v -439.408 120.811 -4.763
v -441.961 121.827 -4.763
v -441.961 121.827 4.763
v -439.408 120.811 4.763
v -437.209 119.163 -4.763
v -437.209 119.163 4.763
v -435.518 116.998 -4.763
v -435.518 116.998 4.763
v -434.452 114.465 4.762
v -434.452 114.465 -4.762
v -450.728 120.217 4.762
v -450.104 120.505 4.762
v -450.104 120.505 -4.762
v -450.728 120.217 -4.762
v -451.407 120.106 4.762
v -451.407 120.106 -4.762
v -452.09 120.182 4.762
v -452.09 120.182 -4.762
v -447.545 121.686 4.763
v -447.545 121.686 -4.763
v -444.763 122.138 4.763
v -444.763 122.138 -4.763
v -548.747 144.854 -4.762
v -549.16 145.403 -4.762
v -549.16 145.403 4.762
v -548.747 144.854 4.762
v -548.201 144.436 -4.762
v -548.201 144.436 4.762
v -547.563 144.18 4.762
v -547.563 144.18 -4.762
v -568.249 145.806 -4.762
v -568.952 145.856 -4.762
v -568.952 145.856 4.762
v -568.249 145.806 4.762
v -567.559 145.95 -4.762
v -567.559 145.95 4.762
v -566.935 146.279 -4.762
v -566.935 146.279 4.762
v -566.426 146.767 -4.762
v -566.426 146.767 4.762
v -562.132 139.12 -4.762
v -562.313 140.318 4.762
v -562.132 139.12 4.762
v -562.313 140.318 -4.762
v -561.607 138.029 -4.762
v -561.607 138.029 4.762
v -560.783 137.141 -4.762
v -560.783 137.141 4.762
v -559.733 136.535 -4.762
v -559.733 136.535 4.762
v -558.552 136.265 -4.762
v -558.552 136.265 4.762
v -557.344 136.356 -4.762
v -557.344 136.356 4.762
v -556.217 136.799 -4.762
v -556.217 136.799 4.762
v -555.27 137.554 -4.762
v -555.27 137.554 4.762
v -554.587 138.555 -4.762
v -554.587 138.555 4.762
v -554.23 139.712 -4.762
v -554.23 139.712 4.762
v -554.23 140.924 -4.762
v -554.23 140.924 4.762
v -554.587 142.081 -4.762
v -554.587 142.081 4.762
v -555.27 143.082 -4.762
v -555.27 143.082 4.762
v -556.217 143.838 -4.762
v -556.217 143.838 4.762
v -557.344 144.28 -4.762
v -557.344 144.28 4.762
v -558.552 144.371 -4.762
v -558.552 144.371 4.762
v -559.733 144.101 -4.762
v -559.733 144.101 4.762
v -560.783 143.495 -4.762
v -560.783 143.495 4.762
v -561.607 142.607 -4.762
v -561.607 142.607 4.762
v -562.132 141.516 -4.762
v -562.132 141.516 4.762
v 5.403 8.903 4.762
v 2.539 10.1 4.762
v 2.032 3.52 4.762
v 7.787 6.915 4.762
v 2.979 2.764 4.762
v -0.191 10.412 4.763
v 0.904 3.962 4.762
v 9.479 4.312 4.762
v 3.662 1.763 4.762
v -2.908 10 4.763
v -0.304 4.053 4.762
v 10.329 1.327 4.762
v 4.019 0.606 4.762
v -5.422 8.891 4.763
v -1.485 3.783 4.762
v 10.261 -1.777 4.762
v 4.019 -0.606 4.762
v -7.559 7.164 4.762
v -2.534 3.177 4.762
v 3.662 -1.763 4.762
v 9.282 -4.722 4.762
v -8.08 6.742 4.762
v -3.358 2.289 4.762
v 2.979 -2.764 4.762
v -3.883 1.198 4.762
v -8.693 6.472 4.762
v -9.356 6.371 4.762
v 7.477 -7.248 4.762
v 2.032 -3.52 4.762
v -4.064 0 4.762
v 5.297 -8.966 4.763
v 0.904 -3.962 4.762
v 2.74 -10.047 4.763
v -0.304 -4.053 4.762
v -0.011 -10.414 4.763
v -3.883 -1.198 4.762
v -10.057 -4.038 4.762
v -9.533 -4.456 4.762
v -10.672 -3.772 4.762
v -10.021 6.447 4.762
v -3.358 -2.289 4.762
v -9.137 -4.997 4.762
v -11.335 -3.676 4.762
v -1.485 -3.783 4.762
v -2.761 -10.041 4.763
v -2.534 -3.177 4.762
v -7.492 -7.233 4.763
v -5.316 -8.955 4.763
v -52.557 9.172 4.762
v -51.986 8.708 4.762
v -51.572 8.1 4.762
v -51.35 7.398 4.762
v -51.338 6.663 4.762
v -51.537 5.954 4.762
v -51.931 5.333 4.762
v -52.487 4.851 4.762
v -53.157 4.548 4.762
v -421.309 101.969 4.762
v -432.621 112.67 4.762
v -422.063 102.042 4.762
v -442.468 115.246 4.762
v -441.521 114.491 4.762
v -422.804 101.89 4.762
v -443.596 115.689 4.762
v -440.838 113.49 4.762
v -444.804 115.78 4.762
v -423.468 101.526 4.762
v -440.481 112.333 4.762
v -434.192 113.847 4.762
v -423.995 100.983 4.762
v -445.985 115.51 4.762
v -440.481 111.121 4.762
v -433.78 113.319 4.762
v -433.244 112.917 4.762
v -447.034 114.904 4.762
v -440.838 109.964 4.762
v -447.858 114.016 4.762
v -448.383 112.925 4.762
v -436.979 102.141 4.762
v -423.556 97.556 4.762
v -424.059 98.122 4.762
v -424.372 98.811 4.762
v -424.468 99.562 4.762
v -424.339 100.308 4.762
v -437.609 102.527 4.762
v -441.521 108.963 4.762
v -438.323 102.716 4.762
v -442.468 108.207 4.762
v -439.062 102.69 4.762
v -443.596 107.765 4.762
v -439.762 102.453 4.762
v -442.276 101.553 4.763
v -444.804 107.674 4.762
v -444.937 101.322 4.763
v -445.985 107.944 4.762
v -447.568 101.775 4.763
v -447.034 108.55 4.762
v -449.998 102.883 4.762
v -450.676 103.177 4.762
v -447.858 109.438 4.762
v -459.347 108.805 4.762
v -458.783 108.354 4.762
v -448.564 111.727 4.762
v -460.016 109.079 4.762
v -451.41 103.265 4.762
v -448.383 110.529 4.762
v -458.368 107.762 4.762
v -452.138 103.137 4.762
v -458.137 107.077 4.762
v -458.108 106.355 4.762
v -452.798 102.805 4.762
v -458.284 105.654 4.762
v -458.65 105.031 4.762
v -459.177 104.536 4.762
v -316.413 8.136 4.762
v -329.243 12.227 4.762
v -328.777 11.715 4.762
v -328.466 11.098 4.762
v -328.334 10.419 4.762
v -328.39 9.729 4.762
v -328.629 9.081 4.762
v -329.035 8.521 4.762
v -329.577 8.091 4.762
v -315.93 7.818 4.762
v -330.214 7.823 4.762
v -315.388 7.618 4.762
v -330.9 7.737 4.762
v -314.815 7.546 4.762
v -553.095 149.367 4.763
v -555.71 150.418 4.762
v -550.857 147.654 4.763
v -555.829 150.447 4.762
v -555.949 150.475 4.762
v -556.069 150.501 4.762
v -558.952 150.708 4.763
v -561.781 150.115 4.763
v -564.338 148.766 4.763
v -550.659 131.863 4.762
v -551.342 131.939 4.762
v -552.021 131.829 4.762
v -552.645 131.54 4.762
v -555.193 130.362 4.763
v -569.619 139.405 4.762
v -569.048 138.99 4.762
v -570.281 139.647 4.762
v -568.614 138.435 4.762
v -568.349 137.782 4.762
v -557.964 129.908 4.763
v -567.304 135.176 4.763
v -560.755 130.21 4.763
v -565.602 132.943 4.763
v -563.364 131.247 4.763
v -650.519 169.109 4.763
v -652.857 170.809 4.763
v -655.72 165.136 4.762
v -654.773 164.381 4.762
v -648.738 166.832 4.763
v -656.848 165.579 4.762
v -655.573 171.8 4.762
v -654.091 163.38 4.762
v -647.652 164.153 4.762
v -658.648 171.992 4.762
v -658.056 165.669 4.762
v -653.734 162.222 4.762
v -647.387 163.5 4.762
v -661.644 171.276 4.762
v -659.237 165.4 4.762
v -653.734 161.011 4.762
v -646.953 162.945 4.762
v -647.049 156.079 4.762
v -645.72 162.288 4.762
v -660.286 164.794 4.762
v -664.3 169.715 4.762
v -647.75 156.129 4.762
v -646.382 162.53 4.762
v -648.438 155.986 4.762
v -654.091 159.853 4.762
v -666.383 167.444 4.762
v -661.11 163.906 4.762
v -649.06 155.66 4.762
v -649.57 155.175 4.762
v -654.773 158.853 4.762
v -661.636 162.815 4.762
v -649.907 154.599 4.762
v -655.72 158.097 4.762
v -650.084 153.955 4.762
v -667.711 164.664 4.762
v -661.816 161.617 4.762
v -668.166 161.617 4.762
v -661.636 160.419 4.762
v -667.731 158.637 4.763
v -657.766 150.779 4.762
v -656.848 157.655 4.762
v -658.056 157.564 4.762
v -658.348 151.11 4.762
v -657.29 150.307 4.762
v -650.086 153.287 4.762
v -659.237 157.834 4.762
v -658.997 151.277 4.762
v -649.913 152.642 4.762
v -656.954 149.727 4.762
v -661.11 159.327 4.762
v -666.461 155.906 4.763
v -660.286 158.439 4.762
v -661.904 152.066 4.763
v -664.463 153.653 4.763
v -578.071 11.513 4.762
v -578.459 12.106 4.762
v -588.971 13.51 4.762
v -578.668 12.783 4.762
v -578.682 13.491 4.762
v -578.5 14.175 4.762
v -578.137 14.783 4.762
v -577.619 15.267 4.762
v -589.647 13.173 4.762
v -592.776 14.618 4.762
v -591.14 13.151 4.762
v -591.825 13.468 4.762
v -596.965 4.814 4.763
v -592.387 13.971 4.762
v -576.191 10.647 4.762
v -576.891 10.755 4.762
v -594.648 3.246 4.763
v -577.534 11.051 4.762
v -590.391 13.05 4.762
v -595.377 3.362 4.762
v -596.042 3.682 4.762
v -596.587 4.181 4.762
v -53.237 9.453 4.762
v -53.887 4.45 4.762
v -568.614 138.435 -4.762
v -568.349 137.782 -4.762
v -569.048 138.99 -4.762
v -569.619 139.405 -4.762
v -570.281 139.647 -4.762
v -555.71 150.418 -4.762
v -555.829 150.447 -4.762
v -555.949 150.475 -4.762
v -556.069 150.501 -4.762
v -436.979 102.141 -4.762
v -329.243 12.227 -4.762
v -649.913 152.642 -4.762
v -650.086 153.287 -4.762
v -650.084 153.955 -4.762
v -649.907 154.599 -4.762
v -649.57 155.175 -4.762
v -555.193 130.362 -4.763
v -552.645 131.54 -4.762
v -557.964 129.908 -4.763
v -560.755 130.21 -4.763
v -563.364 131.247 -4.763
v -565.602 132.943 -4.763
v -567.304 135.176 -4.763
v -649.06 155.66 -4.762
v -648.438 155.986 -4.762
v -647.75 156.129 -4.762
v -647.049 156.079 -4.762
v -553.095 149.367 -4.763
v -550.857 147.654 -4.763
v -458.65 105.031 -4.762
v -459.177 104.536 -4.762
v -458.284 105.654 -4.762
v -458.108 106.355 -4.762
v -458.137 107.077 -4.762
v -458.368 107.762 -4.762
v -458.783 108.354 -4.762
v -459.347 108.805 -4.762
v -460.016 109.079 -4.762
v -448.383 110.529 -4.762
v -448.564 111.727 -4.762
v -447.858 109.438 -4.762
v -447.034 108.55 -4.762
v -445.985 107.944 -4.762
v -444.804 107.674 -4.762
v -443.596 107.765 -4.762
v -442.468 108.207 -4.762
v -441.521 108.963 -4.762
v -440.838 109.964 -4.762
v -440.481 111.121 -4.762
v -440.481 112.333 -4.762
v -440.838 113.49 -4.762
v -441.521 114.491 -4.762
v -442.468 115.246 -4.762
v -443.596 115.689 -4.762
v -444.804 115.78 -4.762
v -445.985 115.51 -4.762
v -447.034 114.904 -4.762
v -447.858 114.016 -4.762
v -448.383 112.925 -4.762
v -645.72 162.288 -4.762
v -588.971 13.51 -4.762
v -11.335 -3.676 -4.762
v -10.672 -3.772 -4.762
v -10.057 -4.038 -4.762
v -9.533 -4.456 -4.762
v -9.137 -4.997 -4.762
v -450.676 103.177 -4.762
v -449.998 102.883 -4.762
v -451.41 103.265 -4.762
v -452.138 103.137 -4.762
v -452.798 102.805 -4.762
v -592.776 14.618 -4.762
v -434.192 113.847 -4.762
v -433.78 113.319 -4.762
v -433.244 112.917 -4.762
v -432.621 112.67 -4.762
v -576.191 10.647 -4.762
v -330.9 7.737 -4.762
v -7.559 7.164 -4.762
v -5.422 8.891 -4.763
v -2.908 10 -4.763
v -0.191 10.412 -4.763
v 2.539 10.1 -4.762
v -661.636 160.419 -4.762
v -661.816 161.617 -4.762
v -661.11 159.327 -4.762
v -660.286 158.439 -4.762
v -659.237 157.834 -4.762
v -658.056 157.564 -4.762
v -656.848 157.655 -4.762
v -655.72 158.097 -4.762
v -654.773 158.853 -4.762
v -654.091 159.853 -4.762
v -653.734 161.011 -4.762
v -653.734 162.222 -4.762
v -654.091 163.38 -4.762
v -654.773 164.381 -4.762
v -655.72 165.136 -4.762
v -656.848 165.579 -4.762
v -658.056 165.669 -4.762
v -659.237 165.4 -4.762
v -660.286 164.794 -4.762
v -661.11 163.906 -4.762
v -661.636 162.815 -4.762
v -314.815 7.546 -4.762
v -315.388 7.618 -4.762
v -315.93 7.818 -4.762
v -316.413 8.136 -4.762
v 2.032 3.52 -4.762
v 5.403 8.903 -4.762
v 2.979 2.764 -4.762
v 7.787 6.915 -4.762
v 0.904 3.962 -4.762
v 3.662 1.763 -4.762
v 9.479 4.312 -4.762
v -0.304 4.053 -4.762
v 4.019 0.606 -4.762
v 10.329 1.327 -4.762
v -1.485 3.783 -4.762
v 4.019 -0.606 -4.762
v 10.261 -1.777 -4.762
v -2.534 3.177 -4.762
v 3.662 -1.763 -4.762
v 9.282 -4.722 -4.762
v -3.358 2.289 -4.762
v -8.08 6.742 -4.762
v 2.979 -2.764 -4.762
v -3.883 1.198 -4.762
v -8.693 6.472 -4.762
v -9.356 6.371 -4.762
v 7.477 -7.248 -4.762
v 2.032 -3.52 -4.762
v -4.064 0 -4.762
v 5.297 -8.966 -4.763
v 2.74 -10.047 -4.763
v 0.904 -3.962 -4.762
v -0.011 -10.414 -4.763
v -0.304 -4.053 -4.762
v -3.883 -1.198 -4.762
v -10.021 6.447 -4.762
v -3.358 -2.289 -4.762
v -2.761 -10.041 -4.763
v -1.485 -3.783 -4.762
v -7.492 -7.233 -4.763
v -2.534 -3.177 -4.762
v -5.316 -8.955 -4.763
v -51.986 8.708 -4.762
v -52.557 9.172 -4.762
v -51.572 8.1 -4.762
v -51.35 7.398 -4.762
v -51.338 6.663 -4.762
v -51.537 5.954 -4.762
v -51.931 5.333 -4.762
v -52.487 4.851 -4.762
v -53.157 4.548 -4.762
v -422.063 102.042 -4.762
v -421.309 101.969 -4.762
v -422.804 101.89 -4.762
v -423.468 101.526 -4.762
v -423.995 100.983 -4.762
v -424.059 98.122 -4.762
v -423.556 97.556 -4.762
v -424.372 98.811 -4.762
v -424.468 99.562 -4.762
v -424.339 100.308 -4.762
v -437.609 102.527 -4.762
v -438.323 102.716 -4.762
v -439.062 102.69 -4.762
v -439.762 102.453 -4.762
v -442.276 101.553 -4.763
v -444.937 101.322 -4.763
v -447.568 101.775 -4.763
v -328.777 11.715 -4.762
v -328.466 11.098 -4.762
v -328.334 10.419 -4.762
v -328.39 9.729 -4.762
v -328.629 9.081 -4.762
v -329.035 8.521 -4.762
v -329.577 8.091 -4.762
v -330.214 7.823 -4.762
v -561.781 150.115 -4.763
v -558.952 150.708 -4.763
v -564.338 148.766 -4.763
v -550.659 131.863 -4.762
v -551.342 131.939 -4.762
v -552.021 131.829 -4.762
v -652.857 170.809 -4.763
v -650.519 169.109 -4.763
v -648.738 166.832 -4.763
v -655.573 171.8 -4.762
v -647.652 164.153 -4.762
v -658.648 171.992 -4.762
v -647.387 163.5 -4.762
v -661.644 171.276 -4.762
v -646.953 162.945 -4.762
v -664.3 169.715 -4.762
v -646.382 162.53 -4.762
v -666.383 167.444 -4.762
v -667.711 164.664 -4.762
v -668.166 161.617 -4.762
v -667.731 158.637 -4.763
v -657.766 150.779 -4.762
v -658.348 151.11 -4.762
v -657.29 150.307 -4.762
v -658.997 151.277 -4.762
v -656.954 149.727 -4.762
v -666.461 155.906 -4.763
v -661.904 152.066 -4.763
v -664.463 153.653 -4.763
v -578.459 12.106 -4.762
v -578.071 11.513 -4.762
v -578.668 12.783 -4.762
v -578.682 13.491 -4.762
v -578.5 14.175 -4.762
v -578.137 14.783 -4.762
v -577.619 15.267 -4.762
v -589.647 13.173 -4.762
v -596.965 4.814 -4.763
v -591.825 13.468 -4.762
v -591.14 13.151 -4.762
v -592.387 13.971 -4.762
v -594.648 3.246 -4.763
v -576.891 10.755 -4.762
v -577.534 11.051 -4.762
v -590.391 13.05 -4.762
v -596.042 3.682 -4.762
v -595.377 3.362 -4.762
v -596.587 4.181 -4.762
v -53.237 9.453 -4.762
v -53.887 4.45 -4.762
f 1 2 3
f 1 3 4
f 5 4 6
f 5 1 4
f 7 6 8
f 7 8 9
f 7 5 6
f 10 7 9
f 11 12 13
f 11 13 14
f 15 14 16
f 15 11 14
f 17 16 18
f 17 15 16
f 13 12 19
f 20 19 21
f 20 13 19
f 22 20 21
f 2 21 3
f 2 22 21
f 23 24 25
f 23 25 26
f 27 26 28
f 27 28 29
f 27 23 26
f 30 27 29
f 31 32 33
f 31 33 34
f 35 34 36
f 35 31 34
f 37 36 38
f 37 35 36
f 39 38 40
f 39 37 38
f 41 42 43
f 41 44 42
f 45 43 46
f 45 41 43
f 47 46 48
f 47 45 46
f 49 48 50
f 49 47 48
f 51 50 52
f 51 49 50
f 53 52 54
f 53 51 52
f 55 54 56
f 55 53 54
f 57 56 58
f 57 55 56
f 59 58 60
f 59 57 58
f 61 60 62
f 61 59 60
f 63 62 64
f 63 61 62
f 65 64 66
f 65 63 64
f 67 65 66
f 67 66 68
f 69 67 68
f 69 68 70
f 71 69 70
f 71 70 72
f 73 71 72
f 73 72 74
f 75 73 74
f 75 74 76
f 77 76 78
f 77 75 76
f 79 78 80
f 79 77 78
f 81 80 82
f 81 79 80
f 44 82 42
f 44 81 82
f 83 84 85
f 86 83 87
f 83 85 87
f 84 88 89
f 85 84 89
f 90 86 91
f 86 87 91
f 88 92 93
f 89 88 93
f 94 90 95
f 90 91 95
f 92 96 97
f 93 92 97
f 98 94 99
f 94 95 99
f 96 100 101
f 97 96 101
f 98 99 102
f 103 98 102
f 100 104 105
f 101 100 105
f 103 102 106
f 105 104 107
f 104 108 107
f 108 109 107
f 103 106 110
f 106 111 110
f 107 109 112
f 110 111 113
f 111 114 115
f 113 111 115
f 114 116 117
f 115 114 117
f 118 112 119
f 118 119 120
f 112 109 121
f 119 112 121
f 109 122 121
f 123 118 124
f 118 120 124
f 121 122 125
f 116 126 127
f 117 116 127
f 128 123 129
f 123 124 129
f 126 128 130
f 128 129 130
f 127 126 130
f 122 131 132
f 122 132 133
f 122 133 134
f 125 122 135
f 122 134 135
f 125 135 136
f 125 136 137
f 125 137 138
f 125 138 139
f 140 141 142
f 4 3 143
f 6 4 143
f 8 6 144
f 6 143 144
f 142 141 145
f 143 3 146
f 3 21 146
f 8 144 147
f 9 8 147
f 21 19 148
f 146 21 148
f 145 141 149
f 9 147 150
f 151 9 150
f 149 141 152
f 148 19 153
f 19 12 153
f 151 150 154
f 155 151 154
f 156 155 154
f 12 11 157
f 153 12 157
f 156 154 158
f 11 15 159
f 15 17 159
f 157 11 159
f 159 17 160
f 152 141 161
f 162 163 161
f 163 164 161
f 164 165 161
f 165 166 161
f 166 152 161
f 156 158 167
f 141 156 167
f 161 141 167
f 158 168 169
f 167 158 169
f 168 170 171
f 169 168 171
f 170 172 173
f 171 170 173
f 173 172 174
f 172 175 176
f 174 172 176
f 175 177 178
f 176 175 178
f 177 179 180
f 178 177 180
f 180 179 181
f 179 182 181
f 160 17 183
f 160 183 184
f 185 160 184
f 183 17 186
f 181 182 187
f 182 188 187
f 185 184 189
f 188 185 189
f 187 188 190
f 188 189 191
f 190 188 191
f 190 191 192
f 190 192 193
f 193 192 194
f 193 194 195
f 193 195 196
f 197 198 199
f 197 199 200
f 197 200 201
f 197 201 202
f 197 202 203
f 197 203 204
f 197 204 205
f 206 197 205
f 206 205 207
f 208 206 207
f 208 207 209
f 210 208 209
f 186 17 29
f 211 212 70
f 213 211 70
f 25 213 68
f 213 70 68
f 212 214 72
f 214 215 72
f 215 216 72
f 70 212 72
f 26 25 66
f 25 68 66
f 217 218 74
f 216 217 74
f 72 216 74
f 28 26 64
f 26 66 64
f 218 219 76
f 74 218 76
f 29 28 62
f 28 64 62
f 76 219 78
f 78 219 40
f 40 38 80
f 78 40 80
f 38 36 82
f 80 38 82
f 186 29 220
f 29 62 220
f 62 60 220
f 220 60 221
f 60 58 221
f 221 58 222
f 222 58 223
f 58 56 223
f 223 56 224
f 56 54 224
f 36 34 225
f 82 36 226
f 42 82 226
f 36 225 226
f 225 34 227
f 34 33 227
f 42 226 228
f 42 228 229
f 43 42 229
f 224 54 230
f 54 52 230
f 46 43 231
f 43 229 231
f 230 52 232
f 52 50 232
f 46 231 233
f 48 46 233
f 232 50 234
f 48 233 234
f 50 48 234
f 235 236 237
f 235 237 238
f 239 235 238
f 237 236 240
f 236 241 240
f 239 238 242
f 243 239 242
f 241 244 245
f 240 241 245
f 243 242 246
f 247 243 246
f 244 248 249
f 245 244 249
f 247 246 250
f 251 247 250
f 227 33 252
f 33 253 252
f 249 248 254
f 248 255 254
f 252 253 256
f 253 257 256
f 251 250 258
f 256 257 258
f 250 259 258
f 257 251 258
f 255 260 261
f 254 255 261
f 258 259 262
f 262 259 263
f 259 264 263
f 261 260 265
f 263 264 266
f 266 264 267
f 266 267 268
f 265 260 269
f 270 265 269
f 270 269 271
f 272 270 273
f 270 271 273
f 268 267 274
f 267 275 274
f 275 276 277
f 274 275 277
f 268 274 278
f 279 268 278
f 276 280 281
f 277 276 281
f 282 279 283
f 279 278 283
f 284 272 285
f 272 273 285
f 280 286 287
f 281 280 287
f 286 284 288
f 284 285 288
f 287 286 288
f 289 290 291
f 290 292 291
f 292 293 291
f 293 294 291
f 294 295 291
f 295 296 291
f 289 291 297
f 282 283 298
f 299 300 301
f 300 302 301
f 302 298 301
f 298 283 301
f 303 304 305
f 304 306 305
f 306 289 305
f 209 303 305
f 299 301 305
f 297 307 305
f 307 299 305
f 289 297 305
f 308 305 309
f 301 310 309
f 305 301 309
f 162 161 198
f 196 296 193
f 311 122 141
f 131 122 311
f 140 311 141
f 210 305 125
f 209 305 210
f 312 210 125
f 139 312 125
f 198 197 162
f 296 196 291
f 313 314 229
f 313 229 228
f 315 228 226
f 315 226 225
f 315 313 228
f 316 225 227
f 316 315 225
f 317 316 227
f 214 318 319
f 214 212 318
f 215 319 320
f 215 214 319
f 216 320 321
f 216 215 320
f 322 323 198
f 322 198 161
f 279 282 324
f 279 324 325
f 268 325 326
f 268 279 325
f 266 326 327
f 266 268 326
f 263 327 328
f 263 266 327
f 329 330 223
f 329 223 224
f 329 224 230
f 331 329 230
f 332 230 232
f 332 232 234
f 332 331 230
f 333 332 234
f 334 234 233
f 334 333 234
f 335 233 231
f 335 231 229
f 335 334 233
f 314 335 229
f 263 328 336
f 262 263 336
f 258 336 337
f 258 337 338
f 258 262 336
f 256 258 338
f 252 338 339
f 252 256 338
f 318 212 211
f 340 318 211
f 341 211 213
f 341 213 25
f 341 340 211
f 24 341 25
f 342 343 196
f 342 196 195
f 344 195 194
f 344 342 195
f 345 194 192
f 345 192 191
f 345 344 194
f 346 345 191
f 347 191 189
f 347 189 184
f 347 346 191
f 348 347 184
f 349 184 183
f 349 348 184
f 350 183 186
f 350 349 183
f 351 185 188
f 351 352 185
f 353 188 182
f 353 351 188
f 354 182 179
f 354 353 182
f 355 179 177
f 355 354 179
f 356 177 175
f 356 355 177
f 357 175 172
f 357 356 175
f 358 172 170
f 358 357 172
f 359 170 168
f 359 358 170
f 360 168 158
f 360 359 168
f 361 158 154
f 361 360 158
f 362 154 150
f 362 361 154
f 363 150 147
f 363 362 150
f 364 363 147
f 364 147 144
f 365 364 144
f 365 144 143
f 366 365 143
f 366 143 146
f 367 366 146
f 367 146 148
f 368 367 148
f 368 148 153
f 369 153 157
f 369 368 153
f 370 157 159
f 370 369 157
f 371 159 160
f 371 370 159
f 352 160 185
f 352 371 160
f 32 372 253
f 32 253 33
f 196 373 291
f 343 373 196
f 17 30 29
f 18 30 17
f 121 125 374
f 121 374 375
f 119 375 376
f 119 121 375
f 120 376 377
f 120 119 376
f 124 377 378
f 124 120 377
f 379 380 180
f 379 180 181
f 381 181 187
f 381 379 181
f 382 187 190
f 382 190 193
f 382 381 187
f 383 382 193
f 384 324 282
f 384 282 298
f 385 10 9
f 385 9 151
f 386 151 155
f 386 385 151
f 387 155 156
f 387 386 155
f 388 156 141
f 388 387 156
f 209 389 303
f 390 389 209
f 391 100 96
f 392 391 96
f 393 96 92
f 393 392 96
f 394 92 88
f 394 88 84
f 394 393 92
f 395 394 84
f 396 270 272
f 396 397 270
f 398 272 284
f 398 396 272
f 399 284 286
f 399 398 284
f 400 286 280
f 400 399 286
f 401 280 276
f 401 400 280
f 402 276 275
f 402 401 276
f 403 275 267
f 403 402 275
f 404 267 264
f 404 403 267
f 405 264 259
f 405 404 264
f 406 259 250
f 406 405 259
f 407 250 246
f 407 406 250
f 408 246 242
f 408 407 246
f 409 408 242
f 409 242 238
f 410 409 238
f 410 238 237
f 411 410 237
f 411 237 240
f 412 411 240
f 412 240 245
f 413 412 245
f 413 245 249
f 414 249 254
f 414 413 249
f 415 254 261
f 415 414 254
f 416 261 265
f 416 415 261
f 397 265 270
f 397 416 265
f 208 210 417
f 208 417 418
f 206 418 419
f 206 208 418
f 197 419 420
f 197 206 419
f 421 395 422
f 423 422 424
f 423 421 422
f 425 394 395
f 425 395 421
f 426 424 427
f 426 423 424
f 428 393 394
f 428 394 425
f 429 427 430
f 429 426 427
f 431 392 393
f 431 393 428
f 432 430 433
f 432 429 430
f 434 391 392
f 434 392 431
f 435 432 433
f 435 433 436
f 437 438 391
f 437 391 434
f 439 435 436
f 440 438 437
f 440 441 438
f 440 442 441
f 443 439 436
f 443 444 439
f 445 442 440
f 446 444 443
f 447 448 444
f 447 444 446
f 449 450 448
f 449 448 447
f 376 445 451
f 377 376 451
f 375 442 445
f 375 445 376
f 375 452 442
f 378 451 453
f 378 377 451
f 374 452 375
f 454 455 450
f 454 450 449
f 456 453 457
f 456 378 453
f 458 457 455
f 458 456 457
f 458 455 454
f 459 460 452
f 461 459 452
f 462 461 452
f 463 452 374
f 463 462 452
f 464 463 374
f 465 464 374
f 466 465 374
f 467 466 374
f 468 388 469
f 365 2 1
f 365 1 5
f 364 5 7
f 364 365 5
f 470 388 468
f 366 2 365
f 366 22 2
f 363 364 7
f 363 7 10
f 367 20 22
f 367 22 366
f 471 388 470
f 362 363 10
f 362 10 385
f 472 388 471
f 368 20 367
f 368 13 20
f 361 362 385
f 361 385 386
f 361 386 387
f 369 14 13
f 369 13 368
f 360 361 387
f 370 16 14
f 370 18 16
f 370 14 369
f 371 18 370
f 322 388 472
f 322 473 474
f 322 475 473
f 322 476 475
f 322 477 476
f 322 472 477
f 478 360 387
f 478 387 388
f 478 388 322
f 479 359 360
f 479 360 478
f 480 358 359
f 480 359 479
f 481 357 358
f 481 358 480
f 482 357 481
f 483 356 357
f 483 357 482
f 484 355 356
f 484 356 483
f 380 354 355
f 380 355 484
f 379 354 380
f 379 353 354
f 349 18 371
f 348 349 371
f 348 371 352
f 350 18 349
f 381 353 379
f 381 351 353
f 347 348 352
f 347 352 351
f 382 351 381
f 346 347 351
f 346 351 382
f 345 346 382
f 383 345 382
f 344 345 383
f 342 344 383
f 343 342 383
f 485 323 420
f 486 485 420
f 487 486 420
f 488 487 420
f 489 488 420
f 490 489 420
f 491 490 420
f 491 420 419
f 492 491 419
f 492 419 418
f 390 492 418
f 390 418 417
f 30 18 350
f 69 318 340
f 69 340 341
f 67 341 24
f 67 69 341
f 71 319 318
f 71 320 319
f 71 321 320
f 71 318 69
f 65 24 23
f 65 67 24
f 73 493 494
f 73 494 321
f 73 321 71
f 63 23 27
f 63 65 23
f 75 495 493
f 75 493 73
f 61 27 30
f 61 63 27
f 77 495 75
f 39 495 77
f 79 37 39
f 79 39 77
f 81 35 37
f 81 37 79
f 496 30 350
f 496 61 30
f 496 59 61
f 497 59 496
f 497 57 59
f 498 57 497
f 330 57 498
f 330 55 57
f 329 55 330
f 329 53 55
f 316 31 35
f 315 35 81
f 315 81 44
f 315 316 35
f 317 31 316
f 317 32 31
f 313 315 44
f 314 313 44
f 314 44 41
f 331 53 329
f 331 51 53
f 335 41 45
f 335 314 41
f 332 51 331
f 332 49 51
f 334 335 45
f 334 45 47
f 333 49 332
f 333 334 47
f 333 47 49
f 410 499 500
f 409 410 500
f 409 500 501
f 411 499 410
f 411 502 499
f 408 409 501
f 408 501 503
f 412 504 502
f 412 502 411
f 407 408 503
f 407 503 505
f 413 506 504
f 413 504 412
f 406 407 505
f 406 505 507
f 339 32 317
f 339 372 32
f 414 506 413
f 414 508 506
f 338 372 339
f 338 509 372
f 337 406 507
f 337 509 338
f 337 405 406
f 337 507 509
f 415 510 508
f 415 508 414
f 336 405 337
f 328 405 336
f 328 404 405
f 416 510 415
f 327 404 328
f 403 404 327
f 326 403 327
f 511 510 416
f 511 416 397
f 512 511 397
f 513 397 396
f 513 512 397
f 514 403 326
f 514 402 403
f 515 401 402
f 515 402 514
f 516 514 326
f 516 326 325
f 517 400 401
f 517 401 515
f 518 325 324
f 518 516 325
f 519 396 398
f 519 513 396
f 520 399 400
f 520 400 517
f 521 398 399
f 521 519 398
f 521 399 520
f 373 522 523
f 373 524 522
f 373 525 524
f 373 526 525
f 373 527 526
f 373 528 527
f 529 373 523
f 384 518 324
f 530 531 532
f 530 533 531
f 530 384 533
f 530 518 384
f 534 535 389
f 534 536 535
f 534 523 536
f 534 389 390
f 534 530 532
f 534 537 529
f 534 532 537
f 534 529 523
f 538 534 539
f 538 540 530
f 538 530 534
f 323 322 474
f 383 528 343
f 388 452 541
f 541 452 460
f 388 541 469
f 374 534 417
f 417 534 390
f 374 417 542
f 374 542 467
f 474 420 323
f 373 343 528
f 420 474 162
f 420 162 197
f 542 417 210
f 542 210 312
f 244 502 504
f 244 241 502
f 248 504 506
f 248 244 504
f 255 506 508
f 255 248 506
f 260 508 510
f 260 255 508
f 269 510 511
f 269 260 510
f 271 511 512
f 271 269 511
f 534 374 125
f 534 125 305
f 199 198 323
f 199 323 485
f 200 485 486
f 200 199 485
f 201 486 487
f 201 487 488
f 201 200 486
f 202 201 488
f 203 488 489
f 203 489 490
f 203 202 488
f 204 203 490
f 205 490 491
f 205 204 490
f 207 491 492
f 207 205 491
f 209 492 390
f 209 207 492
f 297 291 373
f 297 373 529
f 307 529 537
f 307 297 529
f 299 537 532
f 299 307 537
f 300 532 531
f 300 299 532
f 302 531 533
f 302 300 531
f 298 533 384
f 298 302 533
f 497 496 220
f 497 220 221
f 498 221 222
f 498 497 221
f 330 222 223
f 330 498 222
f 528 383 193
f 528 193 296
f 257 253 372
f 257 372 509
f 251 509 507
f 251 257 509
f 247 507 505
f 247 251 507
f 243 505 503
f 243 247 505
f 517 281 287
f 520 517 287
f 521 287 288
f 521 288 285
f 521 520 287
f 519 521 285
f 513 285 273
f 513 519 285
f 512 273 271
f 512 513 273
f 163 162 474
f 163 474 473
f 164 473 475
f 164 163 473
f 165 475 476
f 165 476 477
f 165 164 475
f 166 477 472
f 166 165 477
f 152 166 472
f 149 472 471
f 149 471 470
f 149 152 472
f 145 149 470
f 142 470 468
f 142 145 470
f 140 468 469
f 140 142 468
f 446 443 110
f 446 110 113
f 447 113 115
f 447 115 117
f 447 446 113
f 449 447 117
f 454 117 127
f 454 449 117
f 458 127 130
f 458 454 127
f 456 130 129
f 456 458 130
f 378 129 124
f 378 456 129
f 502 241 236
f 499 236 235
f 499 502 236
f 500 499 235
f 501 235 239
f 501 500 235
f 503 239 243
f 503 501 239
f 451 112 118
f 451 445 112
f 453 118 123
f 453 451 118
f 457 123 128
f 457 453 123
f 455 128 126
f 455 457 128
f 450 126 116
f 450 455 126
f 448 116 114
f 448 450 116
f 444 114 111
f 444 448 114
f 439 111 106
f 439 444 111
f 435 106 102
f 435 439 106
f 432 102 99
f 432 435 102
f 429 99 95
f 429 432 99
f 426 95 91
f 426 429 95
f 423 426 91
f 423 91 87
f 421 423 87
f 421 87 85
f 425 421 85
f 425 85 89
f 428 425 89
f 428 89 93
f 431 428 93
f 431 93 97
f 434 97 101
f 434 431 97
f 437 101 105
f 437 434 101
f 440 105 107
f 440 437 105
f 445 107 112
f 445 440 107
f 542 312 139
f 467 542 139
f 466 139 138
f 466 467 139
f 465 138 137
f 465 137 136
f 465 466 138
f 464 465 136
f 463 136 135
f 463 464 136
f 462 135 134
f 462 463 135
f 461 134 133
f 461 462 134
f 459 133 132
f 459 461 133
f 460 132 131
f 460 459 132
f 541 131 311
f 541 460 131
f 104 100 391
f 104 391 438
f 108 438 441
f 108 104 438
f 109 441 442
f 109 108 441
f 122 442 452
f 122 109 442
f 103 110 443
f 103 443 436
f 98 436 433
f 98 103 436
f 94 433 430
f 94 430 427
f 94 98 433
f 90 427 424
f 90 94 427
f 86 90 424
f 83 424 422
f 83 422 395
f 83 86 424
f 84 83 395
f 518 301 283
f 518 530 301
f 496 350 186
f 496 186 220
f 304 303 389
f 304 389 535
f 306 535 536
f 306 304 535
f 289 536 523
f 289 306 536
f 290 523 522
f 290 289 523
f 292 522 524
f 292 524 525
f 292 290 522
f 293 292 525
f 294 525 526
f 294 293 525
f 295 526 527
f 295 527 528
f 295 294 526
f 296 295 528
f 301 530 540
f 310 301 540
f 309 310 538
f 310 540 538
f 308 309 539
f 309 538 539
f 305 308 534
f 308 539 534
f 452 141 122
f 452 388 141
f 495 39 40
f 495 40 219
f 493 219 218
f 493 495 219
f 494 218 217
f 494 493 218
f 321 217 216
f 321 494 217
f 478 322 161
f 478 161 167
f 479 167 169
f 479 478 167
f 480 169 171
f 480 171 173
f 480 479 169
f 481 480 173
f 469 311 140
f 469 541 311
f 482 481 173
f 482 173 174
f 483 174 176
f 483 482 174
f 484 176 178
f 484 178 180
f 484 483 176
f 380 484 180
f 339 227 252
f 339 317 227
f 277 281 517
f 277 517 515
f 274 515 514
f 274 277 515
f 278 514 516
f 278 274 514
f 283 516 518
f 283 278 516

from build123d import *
from build123d.topology import SkipClean

# Parameters (mm, degrees)
SKETCH1_R               = 4.064
BOSS_EXTRUDE1_DEPTH     = 4.7625
CUT_EXTRUDE2_DEPTH      = 690.973625243
CUT_EXTRUDE2_DEPTH_BACK = 690.973625243
FILLET5_R               = 2.54


with BuildPart() as part:
    # Sketch1 → Boss-Extrude1 (new, symmetric)
    with BuildSketch(Plane.XY):
        with BuildLine():
            Line((-668.166397408, 161.616774863), (-668.166397408, 18.64362624))
            Line((-668.166397408, 18.64362624), (-87.838367094, -105.574938169))
            Line((-87.838367094, -105.574938169), (7.477398085, -7.248442169))
            ThreePointArc((7.477398085, -7.248442169), (10.016034099, 2.851395611), (2.538636014, 10.09983778))
            Line((2.538636014, 10.09983778), (-555.710049471, 150.417954639))
            ThreePointArc((-555.710049471, 150.417954639), (-555.889133178, 150.461287413), (-556.068955499, 150.501445056))
            Line((-556.068955499, 150.501445056), (-655.572667421, 171.800103061))
            ThreePointArc((-655.572667421, 171.800103061), (-664.300362279, 169.714648167), (-668.166397408, 161.616774863))
        make_face()
        with Locations(Location((-444.5, 111.726914125, 0), (0, 0, 180))):
            Circle(SKETCH1_R, mode=Mode.SUBTRACT)
        with Locations(Location((-657.752397408, 161.616774863, 0), (0, 0, 180))):
            Circle(SKETCH1_R, mode=Mode.SUBTRACT)
        with Locations(Location((0, 0, 0), (0, 0, 180))):
            Circle(SKETCH1_R, mode=Mode.SUBTRACT)
        with Locations(Location((-558.248685485, 140.318116858, 0), (0, 0, 180))):
            Circle(SKETCH1_R, mode=Mode.SUBTRACT)
    extrude(amount=BOSS_EXTRUDE1_DEPTH, both=True)

    # Sketch3 → Cut-Extrude2 (cut, two sides: drawn at the far end of the back side and taken through both)
    with SkipClean():  # the faces are left unmerged after this step: merging them gives an invalid solid
        with BuildSketch(Plane.XY.offset(-CUT_EXTRUDE2_DEPTH_BACK)):
            with BuildLine():
                Line((-441.961363863, 121.826751874), (-555.710049471, 150.417954639))
                ThreePointArc((-555.710049471, 150.417954639), (-551.509786292, 148.257804111), (-548.695715232, 144.464459263))
                Line((-548.695715232, 144.464459263), (-450.957072675, 119.897447062))
                ThreePointArc((-450.957072675, 119.897447062), (-446.683824739, 121.909364985), (-441.961363863, 121.826751874))
            make_face()
            with BuildLine():
                Line((2.538636014, 10.09983778), (-441.961363863, 121.826751874))
                ThreePointArc((-441.961363863, 121.826751874), (-436.714943747, 118.643871197), (-434.171590545, 113.059338277))
                Line((-434.171590545, 113.059338277), (-8.470870908, 6.057701053))
                ThreePointArc((-8.470870908, 6.057701053), (-3.589229728, 9.775930951), (2.538636014, 10.09983778))
            make_face()
            with BuildLine():
                ThreePointArc((-567.282647841, 145.498746179), (-562.491547061, 149.8286122), (-556.068955499, 150.501445056))
                Line((-556.068955499, 150.501445056), (-655.572667421, 171.800103061))
                ThreePointArc((-655.572667421, 171.800103061), (-649.98823881, 168.557180995), (-647.389331402, 162.645492005))
                Line((-647.389331402, 162.645492005), (-567.282647841, 145.498746179))
            make_face()
            with BuildLine():
                Line((-454.629375008, 107.72545344), (-551.79161281, 132.147583922))
                ThreePointArc((-551.79161281, 132.147583922), (-562.318768923, 130.73240787), (-568.611751491, 139.289399717))
                Line((-568.611751491, 139.289399717), (-648.718435052, 156.436145543))
                ThreePointArc((-648.718435052, 156.436145543), (-649.539598332, 155.213546979), (-650.525019748, 154.119014654))
                Line((-650.525019748, 154.119014654), (-591.564686258, 11.691300387))
                Line((-591.564686258, 11.691300387), (-454.629375008, 107.72545344))
            make_face()
            with BuildLine():
                ThreePointArc((-657.565596078, 151.204450375), (-665.04986433, 154.187214141), (-668.166397408, 161.616774863))
                Line((-668.166397408, 161.616774863), (-668.166397408, 18.64362624))
                Line((-668.166397408, 18.64362624), (-596.32392942, 3.265826494))
                Line((-596.32392942, 3.265826494), (-657.565596078, 151.204450375))
            make_face()
            with BuildLine():
                Line((-87.838367094, -105.574938169), (7.477398085, -7.248442169))
                ThreePointArc((7.477398085, -7.248442169), (-2.105505073, -10.198933493), (-9.73654702, -3.694732483))
                Line((-9.73654702, -3.694732483), (-596.32392942, 3.265826494))
                Line((-596.32392942, 3.265826494), (-87.838367094, -105.574938169))
            make_face()
            with BuildLine():
                ThreePointArc((-438.373626695, 103.305575388), (-444.936585447, 101.322069621), (-451.310312416, 103.848396447))
                Line((-451.310312416, 103.848396447), (-584.072378221, 10.740983679))
                Line((-584.072378221, 10.740983679), (-323.761303231, 7.652082274))
                Line((-323.761303231, 7.652082274), (-438.373626695, 103.305575388))
            make_face()
            Polygon((-32.313863809, 4.193710765), (-432.091689332, 104.679521297), (-315.718749539, 7.556647781), align=None)
        extrude(amount=CUT_EXTRUDE2_DEPTH + CUT_EXTRUDE2_DEPTH_BACK, mode=Mode.SUBTRACT)

    # Fillet5
    # the kernel refuses this fillet: 2.54 mm, written as the material it adds along each edge
    with BuildSketch(Plane(origin=(-432.091689332, 104.679521297, 4.7625), x_dir=(0.9698327040744903, -0.24377146286545154, 0), z_dir=(0, 0, -1))) as fillet5_piece_1:
        with BuildLine():
            CenterArc((FILLET5_R * 4.37701255665, FILLET5_R), FILLET5_R, 115.738557535, 154.261442465)
            Line((FILLET5_R * 3.94274718517, FILLET5_R * 1.90078498386), (0, 0))
            Line((0, 0), (FILLET5_R * 4.37701255665, 0))
        make_face()
    extrude(amount=9.525)
    with BuildSketch(Plane(origin=(-32.313863809, 4.193710765, -4.7625), x_dir=(-0.9698327040744894, 0.24377146286545465, 0), z_dir=(0, 0, 1))) as fillet5_piece_2:
        with BuildLine():
            CenterArc((FILLET5_R * 8.4937923688, FILLET5_R), FILLET5_R, 103.429391771, 166.570608229)
            Line((FILLET5_R * 8.26154547816, FILLET5_R * 1.97265686744), (0, 0))
            Line((0, 0), (FILLET5_R * 8.4937923688, 0))
        make_face()
    extrude(amount=9.525)
    with BuildSketch(Plane(origin=(-315.718749539, 7.556647781, 4.7625), x_dir=(-0.7677492318062843, 0.6407504327434048, 0), z_dir=(0, 0, -1))) as fillet5_piece_3:
        with BuildLine():
            CenterArc((FILLET5_R * 0.355768854879, FILLET5_R), FILLET5_R, 230.832050694, 39.167949306)
            Line((-FILLET5_R * 0.275826852618, FILLET5_R * 0.224702081603), (0, 0))
            Line((0, 0), (FILLET5_R * 0.355768854879, 0))
        make_face()
    extrude(amount=9.525)
    with BuildSketch(Plane(origin=(-450.957072675, 119.897447062, 4.7625), x_dir=(-0.9698327040744915, 0.24377146286544657, 0), z_dir=(0, 0, -1))) as fillet5_piece_4:
        with BuildLine():
            CenterArc((1.167973372, 2.54), FILLET5_R, 223.335922736, 46.664077264)
            ThreePointArc((-0.679476901, 0.796862745), (-0.329715617, 0.406977742), (0, 0))
            Line((0, 0), (1.167973372, 0))
        make_face()
    extrude(amount=9.525)
    with BuildSketch(Plane(origin=(-548.695715232, 144.464459263, -4.7625), x_dir=(-0.44376973183337304, 0.8961408511548484, 0), z_dir=(0, 0, 1))) as fillet5_piece_5:
        with BuildLine():
            CenterArc((1.174934772, -2.536787354), FILLET5_R, 92.882026708, 46.664077264)
            Line((-0.75782313, -0.888744002), (0, 0))
            ThreePointArc((0, 0), (0.523612236, -0.013171849), (1.047224471, 0))
        make_face()
    extrude(amount=9.525)
    with BuildSketch(Plane(origin=(-9.73654702, -3.694732483, 4.7625), x_dir=(0.4182943281117258, -0.9083115407554614, 0), z_dir=(0, 0, -1)), Plane(origin=(-650.525019748, 154.119014654, 4.7625), x_dir=(0.670494914726067, 0.7419141253045962, 0), z_dir=(0, 0, -1))) as fillet5_piece_6:
        with BuildLine():
            CenterArc((1.608371465, 2.533976504), FILLET5_R, 205.406798902, 60.646529945)
            Line((-0.68597088, 1.444209004), (0, 0))
            ThreePointArc((0, 0), (0.71677424, 0.024696333), (1.43354848, 0))
        make_face()
    extrude(amount=9.525)
    with BuildSketch(Plane(origin=(-647.389331402, 162.645492005, 4.7625), x_dir=(-0.17163878928589119, 0.985159949456165, 0), z_dir=(0, 0, -1))) as fillet5_piece_7:
        with BuildLine():
            CenterArc((1.717153467, 2.533133012), FILLET5_R, 201.964897943, 63.821031296)
            Line((-0.638476016, 1.583075254), (0, 0))
            ThreePointArc((0, 0), (0.765253175, 0.028154653), (1.530506351, 0))
        make_face()
    extrude(amount=9.525)
    with BuildSketch(Plane(origin=(-567.282647841, 145.498746179, -4.7625), x_dir=(-0.9778498365567232, 0.20930766146032473, 0), z_dir=(0, 0, 1))) as fillet5_piece_8:
        with BuildLine():
            CenterArc((1.706979462, -2.54), FILLET5_R, 90, 63.821031296)
            ThreePointArc((-0.57246828, -1.419411765), (-0.260123144, -0.720236806), (0, 0))
            Line((0, 0), (1.706979462, 0))
        make_face()
    extrude(amount=9.525)
    with BuildSketch(Plane(origin=(-648.718435052, 156.436145543, 4.7625), x_dir=(0.9778498365567261, -0.20930766146031107, 0), z_dir=(0, 0, -1))) as fillet5_piece_9:
        with BuildLine():
            CenterArc((1.706979462, 2.54), FILLET5_R, 206.178968704, 63.821031296)
            ThreePointArc((-0.57246828, 1.419411765), (-0.260123144, 0.720236806), (0, 0))
            Line((0, 0), (1.706979462, 0))
        make_face()
    extrude(amount=9.525)
    with BuildSketch(Plane(origin=(-568.611751491, 139.289399717, -4.7625), x_dir=(0.1716387892858222, -0.9851599494561769, 0), z_dir=(0, 0, 1))) as fillet5_piece_10:
        with BuildLine():
            CenterArc((1.717153467, -2.533133012), FILLET5_R, 94.214070761, 63.821031296)
            Line((-0.638476016, -1.583075254), (0, 0))
            ThreePointArc((0, 0), (0.765253175, -0.028154653), (1.530506351, 0))
        make_face()
    extrude(amount=9.525)
    with BuildSketch(Plane(origin=(-551.79161281, 132.147583922, -4.7625), x_dir=(0.9698327040744915, -0.24377146286544651, 0), z_dir=(0, 0, 1))) as fillet5_piece_11:
        with BuildLine():
            CenterArc((1.167973372, -2.54), FILLET5_R, 90, 46.664077264)
            ThreePointArc((-0.679476901, -0.796862745), (-0.329715617, -0.406977742), (0, 0))
            Line((0, 0), (1.167973372, 0))
        make_face()
    extrude(amount=9.525)
    with BuildSketch(Plane(origin=(-454.629375008, 107.72545344, -4.7625), x_dir=(-0.9698327040744891, 0.24377146286545595, 0), z_dir=(0, 0, 1))) as fillet5_piece_12:
        with BuildLine():
            CenterArc((FILLET5_R * 2.18662804116, FILLET5_R), FILLET5_R, 139.151619975, 130.848380025)
            Line((FILLET5_R * 1.4301849976, FILLET5_R * 1.65405957057), (0, 0))
            Line((0, 0), (FILLET5_R * 2.18662804116, 0))
        make_face()
    extrude(amount=9.525)
    with BuildSketch(Plane(origin=(-591.564686258, 11.691300387, 4.7625), x_dir=(-0.38248875056705317, 0.9239601483233217, 0), z_dir=(0, 0, -1))) as fillet5_piece_13:
        with BuildLine():
            CenterArc((FILLET5_R * 1.24718774025, FILLET5_R), FILLET5_R, 167.445549697, 102.554450303)
            Line((FILLET5_R * 0.271097864551, FILLET5_R * 1.21736732635), (0, 0))
            Line((0, 0), (FILLET5_R * 1.24718774025, 0))
        make_face()
    extrude(amount=9.525)
    with BuildSketch(Plane(origin=(-451.310312416, 103.848396447, -4.7625), x_dir=(0.8053622455004413, -0.5927829733743091, 0), z_dir=(0, 0, 1))) as fillet5_piece_14:
        with BuildLine():
            CenterArc((1.827697503, -2.532219008), FILLET5_R, 94.485895933, 66.911227563)
            Line((-0.579593582, -1.721941504), (0, 0))
            ThreePointArc((0, 0), (0.814517365, -0.031902068), (1.629034731, 0))
        make_face()
    extrude(amount=9.525)
    with BuildSketch(Plane(origin=(-438.373626695, 103.305575388, -4.7625), x_dir=(-0.8521900532222071, -0.5232323701656196, 0), z_dir=(0, 0, 1))) as fillet5_piece_15:
        with BuildLine():
            CenterArc((1.827697503, 2.532219008), FILLET5_R, 198.602876504, 66.911227563)
            Line((-0.579593582, 1.721941504), (0, 0))
            ThreePointArc((0, 0), (0.814517365, 0.031902068), (1.629034731, 0))
        make_face()
    extrude(amount=9.525)
    with BuildSketch(Plane(origin=(-323.761303231, 7.652082274, 4.7625), x_dir=(-0.9999296041682059, 0.011865357475233242, 0), z_dir=(0, 0, -1))) as fillet5_piece_16:
        with BuildLine():
            CenterArc((FILLET5_R * 2.8108137806, FILLET5_R), FILLET5_R, 129.167949306, 140.832050694)
            Line((FILLET5_R * 2.1792180731, FILLET5_R * 1.7752979184), (0, 0))
            Line((0, 0), (FILLET5_R * 2.8108137806, 0))
        make_face()
    extrude(amount=9.525)
    with BuildSketch(Plane(origin=(-584.072378221, 10.740983679, 4.7625), x_dir=(0.8187275892564178, 0.5741821440887678, 0), z_dir=(0, 0, -1))) as fillet5_piece_17:
        with BuildLine():
            CenterArc((FILLET5_R * 3.10325901667, FILLET5_R), FILLET5_R, 125.722228204, 144.277771796)
            Line((FILLET5_R * 2.51940279709, FILLET5_R * 1.81185707785), (0, 0))
            Line((0, 0), (FILLET5_R * 3.10325901667, 0))
        make_face()
    extrude(amount=9.525)
    with BuildSketch(Plane(origin=(-8.470870908, 6.057701053, 4.7625), x_dir=(-0.9698327040744897, 0.2437714628654535, 0), z_dir=(0, 0, -1))) as fillet5_piece_18:
        with BuildLine():
            CenterArc((1.598841985, 2.54), FILLET5_R, 209.353470055, 60.646529945)
            ThreePointArc((-0.61505297, 1.294901961), (-0.285218673, 0.658046752), (0, 0))
            Line((0, 0), (1.598841985, 0))
        make_face()
    extrude(amount=9.525)
    with BuildSketch(Plane(origin=(-434.171590545, 113.059338277, -4.7625), x_dir=(-0.19590431977265832, 0.9806230149728344, 0), z_dir=(0, 0, 1)), Plane(origin=(-657.565596078, 151.204450375, 4.7625), x_dir=(-0.9987026389046928, 0.05092189160668163, 0), z_dir=(0, 0, -1))) as fillet5_piece_19:
        with BuildLine():
            CenterArc((1.608371465, -2.533976504), FILLET5_R, 93.946671153, 60.646529945)
            Line((-0.68597088, -1.444209004), (0, 0))
            ThreePointArc((0, 0), (0.71677424, -0.024696333), (1.43354848, 0))
        make_face()
    extrude(amount=9.525)
    # the kernel refuses this fillet: 2.54 mm, written as the material it takes off along each edge
    with BuildSketch(Plane(origin=(-596.32392942, 3.265826494, -8.952115902), x_dir=(0.999929604168206, -0.011865357475233589, 0), z_dir=(0, 0, 1))) as fillet5_2_piece_1:
        with BuildLine():
            CenterArc((FILLET5_R * 0.659782031773, FILLET5_R), FILLET5_R, 203.167777901, 66.832222099)
            Line((-FILLET5_R * 0.259574707851, FILLET5_R * 0.606575057594), (0, 0))
            Line((0, 0), (FILLET5_R * 0.659782031773, 0))
        make_face()
    extrude(amount=17.904231804, mode=Mode.SUBTRACT)


solid = part.part
